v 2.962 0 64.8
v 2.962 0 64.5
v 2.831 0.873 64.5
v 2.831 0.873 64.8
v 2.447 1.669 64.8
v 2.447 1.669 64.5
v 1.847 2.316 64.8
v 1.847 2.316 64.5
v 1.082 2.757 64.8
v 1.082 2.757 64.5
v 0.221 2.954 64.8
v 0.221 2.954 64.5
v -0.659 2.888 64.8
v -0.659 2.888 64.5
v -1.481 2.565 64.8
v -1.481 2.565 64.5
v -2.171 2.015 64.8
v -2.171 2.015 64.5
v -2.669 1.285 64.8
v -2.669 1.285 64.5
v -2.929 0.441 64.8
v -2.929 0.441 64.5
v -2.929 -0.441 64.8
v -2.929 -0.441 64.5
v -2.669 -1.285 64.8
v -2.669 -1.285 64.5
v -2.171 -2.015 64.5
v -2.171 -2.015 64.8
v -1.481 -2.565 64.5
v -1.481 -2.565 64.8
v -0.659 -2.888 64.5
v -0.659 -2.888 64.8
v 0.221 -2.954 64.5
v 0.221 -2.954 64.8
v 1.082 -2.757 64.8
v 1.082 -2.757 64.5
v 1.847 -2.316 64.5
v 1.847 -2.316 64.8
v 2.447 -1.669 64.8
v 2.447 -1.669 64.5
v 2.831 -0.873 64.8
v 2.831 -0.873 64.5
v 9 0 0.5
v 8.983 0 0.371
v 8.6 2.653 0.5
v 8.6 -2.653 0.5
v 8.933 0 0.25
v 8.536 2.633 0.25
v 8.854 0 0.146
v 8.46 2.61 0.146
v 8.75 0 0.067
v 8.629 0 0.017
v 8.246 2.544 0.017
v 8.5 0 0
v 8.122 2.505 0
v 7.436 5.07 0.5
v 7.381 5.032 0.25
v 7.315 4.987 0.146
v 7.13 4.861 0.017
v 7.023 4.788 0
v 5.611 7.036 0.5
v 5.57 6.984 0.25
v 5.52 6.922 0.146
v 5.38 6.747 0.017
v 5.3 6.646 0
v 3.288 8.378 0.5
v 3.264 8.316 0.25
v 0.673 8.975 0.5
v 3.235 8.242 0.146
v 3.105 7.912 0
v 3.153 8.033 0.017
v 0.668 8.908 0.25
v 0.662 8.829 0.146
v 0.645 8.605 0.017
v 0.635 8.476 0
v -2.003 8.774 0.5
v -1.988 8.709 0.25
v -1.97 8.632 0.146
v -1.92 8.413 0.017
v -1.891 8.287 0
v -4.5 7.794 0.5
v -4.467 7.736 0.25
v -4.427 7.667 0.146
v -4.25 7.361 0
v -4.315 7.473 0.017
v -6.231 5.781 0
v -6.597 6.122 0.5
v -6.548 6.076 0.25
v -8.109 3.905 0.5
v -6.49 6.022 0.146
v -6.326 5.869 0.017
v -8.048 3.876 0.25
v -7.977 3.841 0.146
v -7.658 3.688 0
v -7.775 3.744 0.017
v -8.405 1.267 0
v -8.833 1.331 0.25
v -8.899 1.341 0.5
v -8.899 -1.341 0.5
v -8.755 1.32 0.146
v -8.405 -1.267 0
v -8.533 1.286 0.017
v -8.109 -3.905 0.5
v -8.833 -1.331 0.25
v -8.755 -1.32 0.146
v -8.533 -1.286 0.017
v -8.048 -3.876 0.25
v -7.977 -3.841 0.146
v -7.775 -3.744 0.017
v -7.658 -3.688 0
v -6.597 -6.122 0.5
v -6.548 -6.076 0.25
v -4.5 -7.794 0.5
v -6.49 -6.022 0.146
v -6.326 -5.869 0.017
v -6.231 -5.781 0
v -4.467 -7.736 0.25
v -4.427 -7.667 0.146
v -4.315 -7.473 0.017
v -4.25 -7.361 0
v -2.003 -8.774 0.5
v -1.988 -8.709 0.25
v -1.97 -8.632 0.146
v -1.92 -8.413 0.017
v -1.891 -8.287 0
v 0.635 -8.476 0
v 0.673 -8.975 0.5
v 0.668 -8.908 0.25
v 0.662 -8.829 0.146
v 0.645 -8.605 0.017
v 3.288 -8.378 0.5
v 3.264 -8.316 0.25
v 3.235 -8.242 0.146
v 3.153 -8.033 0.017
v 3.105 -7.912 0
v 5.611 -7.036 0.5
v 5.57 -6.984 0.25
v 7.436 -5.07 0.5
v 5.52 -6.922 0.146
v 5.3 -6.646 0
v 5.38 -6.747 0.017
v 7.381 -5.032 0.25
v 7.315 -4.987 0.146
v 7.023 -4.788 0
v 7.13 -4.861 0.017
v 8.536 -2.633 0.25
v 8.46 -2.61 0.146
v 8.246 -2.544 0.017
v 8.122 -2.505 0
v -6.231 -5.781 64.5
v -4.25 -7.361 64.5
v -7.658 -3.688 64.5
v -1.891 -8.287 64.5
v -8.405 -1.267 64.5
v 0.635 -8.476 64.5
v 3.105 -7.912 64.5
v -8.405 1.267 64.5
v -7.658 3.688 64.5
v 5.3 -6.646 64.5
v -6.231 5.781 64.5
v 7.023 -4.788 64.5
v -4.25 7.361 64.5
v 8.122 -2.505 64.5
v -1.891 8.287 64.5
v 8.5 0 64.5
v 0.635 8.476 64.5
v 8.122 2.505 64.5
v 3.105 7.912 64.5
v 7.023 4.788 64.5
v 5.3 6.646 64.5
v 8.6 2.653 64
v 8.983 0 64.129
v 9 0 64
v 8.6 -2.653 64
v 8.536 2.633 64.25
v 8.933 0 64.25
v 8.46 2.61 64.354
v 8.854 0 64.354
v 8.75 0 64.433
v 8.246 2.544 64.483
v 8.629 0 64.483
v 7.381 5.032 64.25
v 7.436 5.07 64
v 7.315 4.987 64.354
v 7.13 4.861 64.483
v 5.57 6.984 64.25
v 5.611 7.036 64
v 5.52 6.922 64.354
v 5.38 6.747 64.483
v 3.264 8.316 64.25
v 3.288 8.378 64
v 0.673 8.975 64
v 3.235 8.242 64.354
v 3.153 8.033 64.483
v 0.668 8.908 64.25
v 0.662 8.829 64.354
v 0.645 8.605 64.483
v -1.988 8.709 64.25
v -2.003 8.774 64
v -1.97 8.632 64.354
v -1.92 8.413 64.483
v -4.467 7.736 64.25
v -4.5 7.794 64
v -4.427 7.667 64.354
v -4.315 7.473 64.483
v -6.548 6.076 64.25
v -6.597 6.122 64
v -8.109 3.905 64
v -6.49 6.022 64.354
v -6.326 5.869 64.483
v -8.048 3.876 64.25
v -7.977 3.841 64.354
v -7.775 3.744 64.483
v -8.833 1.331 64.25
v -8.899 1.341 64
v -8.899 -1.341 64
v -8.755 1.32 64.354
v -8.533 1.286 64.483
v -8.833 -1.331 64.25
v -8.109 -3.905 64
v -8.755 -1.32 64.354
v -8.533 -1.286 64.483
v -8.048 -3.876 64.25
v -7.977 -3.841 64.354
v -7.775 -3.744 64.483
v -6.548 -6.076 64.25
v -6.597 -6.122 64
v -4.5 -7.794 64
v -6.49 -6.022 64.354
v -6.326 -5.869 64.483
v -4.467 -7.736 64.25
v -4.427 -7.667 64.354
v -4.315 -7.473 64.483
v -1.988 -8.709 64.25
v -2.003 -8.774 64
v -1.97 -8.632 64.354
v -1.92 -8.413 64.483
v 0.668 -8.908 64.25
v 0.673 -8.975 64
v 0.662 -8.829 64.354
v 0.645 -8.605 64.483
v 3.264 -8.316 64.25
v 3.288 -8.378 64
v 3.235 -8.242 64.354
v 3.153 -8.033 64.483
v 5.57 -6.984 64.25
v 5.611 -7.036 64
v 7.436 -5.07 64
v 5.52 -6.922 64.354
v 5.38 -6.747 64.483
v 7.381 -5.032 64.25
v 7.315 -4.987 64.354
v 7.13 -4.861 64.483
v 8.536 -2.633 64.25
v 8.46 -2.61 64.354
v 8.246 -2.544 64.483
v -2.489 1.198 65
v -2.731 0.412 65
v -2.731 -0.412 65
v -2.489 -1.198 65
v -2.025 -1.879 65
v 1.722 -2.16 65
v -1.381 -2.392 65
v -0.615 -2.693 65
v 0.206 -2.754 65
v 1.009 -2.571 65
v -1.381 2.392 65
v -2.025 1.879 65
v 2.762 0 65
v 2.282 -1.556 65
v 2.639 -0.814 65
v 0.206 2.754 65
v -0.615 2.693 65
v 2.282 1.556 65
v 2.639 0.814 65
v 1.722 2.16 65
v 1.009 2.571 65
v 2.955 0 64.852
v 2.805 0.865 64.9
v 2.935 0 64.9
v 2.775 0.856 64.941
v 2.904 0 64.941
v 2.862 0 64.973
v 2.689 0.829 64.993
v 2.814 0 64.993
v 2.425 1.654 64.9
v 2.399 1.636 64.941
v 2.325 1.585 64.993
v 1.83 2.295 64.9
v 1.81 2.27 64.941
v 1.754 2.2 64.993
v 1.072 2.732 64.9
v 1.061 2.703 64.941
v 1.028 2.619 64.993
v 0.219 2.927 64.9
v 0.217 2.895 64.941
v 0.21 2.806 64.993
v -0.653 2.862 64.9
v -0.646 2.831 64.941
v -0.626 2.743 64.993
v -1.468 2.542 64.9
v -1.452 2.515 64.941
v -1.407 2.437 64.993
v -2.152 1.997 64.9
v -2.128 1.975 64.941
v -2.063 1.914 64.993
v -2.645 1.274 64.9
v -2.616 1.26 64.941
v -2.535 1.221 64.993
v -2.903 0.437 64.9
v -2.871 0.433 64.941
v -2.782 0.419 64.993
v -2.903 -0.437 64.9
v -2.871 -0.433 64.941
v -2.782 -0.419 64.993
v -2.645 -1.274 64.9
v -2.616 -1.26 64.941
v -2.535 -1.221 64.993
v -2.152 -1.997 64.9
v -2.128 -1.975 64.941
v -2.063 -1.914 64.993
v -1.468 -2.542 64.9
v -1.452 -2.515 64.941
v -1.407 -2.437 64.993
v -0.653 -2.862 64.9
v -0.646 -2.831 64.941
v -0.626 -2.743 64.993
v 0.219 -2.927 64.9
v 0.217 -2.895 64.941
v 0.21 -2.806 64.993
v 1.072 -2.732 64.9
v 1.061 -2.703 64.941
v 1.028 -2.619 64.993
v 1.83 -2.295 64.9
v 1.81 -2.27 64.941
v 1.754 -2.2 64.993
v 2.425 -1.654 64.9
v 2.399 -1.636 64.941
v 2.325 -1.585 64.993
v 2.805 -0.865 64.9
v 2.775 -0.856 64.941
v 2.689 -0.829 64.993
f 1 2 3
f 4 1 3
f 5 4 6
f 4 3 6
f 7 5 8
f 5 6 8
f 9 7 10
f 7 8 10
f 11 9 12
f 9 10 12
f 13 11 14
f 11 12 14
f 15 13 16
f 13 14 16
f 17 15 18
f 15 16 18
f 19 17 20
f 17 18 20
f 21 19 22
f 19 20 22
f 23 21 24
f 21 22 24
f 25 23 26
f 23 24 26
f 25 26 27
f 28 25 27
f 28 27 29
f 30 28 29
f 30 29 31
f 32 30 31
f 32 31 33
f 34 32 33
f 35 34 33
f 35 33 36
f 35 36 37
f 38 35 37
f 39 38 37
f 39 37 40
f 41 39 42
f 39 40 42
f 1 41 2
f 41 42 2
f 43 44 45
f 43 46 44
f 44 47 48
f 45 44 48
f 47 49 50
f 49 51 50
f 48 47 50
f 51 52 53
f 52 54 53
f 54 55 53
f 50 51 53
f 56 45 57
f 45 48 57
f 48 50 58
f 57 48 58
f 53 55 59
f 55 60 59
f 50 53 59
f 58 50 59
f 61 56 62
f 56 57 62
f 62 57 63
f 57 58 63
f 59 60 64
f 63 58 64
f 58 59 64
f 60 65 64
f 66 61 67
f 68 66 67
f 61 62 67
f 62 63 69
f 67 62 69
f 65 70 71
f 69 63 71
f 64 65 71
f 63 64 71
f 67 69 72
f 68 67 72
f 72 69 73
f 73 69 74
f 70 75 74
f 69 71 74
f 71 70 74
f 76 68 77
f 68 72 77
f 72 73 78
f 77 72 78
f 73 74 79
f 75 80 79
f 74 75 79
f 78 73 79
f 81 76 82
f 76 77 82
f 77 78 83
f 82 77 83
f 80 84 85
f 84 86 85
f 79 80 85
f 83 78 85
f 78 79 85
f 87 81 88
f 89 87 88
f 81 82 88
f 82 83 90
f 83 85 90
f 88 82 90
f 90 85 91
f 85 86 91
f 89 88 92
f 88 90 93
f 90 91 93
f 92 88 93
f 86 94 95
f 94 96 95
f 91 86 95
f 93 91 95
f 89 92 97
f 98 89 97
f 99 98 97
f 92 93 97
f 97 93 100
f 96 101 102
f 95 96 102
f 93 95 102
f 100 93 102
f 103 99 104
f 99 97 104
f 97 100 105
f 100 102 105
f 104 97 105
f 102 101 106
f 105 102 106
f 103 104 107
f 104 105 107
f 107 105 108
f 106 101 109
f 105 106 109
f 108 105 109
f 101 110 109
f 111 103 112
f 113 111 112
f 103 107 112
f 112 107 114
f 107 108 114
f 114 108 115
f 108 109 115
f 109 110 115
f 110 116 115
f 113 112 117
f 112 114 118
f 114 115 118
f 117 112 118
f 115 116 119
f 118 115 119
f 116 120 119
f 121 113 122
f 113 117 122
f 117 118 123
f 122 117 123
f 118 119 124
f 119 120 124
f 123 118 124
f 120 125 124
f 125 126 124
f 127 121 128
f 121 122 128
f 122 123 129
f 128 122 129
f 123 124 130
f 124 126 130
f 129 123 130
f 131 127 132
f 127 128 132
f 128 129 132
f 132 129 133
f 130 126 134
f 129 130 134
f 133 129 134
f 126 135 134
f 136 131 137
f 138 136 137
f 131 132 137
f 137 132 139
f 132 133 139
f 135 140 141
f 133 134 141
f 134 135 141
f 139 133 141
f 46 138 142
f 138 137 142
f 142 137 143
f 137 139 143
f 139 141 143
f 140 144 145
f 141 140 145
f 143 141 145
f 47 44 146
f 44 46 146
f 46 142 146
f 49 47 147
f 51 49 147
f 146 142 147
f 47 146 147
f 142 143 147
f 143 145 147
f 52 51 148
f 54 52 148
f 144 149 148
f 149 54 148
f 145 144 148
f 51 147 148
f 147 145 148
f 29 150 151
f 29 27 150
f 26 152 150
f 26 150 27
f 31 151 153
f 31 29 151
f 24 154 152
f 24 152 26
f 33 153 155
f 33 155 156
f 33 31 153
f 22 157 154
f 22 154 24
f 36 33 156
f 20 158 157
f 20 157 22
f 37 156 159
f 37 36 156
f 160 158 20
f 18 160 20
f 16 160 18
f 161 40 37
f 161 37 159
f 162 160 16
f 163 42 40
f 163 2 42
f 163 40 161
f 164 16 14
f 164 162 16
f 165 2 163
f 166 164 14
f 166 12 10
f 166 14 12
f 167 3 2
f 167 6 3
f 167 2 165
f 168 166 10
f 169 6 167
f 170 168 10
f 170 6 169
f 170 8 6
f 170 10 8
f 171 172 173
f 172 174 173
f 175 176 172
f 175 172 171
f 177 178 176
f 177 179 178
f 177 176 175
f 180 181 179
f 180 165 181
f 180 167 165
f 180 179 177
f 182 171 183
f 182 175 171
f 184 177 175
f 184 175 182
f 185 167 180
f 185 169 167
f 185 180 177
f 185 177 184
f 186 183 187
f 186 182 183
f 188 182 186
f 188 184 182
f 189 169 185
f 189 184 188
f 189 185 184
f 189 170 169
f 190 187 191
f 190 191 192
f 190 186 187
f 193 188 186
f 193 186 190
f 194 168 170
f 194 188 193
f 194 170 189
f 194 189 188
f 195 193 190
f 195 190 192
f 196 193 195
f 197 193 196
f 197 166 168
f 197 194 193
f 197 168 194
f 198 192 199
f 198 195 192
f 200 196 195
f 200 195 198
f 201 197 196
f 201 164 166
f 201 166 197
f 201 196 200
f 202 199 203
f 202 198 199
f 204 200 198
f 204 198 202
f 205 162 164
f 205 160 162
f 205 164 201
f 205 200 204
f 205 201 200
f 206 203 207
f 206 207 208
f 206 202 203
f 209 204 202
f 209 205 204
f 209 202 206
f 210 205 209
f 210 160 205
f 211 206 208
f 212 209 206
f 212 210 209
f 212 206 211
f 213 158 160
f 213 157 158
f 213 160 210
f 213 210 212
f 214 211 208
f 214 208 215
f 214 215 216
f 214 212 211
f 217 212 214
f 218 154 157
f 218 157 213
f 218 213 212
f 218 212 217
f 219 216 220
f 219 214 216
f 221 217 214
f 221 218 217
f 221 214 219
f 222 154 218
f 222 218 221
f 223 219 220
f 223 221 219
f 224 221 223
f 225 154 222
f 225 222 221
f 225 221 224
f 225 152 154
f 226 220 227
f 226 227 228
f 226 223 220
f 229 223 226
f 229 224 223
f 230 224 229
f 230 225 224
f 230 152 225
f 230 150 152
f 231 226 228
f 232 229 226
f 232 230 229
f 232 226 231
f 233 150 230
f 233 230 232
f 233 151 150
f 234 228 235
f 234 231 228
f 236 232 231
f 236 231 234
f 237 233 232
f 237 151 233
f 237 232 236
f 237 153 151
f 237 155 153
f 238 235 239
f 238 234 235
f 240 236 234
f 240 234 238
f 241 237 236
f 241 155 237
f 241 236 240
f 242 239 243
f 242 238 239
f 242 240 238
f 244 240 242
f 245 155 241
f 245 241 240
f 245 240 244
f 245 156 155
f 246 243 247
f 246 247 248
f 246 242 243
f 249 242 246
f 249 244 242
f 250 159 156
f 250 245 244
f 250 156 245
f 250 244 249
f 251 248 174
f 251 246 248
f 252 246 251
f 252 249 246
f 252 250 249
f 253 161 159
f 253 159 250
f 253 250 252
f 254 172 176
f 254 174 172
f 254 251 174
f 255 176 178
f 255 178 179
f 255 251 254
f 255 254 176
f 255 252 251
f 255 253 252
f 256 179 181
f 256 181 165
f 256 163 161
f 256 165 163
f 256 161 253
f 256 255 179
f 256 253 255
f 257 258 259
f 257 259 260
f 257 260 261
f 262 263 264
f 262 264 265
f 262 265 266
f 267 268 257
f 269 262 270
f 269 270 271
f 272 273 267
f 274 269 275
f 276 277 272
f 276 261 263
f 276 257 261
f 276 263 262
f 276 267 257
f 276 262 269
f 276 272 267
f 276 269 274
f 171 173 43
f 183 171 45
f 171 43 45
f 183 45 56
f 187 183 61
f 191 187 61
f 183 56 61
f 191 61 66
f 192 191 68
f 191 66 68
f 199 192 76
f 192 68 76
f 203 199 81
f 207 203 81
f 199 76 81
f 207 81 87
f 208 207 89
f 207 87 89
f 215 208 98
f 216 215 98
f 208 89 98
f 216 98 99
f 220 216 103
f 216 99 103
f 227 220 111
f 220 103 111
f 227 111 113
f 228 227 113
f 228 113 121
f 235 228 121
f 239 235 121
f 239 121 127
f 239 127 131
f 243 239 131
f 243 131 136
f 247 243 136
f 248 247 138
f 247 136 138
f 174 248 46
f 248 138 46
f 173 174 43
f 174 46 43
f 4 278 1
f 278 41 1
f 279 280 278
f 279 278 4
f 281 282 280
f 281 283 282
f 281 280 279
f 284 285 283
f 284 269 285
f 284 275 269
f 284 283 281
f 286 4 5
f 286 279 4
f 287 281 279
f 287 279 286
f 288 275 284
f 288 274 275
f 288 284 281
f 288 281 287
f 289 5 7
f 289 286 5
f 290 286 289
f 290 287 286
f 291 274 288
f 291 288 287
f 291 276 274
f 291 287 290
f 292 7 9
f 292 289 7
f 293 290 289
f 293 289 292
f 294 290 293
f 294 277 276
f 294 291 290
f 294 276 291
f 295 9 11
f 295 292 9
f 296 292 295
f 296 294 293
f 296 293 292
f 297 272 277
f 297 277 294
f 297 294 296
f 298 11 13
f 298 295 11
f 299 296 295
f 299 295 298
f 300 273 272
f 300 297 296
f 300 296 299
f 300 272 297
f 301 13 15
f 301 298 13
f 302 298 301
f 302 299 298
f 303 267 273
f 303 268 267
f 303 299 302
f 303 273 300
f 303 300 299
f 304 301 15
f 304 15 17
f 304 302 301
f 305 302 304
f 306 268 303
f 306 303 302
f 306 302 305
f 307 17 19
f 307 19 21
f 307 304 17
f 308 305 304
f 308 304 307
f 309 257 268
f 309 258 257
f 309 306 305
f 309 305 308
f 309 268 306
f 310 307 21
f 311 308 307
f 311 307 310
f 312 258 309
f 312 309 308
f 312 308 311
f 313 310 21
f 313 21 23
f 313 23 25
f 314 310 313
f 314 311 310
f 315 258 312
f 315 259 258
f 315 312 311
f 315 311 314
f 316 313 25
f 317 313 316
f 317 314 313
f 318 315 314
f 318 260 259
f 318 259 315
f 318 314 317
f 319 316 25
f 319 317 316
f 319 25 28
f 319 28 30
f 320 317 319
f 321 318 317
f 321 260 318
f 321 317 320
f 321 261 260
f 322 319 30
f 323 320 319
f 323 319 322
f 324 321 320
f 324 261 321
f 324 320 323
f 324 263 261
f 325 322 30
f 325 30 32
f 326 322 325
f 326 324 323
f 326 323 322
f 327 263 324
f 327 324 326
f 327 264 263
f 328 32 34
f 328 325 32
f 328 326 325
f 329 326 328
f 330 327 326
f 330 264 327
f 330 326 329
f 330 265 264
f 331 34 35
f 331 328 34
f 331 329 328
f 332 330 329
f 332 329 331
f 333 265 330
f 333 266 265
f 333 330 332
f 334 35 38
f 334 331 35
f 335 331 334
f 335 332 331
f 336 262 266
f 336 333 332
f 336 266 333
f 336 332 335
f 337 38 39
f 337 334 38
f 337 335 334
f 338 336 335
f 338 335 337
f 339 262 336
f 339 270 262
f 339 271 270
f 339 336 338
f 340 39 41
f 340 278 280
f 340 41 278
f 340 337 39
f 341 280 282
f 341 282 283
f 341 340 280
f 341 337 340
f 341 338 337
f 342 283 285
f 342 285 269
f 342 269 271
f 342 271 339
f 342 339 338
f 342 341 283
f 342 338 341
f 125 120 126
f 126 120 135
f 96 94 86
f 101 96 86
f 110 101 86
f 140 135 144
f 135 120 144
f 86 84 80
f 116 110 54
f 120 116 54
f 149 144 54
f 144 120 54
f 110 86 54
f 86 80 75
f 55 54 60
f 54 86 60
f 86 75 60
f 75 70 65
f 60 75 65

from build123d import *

# Parameters (mm, degrees)
SKETCH1_R           = 9
BOSS_EXTRUDE1_DEPTH = 64.5
FILLET1_R           = 0.5
SKETCH2_R           = 2.962162188
BOSS_EXTRUDE2_DEPTH = 0.5
FILLET2_R           = 0.2


with BuildPart() as part:
    # Sketch1 → Boss-Extrude1 (new body)
    with BuildSketch(Plane.XY):
        Circle(SKETCH1_R)
    extrude(amount=BOSS_EXTRUDE1_DEPTH)

    # Fillet1
    fillet1_edges = [part.edges().sort_by_distance(p)[0] for p in [
        (-9, 0, 0),
        (-9, 0, 64.5),
    ]]
    fillet(fillet1_edges, radius=FILLET1_R)

    # Sketch2 → Boss-Extrude2 (add)
    with BuildSketch(Plane.XY.offset(64.5)):
        Circle(SKETCH2_R)
    extrude(amount=BOSS_EXTRUDE2_DEPTH)

    # Fillet2
    fillet2_edges = [part.edges().sort_by_distance(p)[0] for p in [
        (-2.962162188, 0, 65),
    ]]
    fillet(fillet2_edges, radius=FILLET2_R)


solid = part.part
